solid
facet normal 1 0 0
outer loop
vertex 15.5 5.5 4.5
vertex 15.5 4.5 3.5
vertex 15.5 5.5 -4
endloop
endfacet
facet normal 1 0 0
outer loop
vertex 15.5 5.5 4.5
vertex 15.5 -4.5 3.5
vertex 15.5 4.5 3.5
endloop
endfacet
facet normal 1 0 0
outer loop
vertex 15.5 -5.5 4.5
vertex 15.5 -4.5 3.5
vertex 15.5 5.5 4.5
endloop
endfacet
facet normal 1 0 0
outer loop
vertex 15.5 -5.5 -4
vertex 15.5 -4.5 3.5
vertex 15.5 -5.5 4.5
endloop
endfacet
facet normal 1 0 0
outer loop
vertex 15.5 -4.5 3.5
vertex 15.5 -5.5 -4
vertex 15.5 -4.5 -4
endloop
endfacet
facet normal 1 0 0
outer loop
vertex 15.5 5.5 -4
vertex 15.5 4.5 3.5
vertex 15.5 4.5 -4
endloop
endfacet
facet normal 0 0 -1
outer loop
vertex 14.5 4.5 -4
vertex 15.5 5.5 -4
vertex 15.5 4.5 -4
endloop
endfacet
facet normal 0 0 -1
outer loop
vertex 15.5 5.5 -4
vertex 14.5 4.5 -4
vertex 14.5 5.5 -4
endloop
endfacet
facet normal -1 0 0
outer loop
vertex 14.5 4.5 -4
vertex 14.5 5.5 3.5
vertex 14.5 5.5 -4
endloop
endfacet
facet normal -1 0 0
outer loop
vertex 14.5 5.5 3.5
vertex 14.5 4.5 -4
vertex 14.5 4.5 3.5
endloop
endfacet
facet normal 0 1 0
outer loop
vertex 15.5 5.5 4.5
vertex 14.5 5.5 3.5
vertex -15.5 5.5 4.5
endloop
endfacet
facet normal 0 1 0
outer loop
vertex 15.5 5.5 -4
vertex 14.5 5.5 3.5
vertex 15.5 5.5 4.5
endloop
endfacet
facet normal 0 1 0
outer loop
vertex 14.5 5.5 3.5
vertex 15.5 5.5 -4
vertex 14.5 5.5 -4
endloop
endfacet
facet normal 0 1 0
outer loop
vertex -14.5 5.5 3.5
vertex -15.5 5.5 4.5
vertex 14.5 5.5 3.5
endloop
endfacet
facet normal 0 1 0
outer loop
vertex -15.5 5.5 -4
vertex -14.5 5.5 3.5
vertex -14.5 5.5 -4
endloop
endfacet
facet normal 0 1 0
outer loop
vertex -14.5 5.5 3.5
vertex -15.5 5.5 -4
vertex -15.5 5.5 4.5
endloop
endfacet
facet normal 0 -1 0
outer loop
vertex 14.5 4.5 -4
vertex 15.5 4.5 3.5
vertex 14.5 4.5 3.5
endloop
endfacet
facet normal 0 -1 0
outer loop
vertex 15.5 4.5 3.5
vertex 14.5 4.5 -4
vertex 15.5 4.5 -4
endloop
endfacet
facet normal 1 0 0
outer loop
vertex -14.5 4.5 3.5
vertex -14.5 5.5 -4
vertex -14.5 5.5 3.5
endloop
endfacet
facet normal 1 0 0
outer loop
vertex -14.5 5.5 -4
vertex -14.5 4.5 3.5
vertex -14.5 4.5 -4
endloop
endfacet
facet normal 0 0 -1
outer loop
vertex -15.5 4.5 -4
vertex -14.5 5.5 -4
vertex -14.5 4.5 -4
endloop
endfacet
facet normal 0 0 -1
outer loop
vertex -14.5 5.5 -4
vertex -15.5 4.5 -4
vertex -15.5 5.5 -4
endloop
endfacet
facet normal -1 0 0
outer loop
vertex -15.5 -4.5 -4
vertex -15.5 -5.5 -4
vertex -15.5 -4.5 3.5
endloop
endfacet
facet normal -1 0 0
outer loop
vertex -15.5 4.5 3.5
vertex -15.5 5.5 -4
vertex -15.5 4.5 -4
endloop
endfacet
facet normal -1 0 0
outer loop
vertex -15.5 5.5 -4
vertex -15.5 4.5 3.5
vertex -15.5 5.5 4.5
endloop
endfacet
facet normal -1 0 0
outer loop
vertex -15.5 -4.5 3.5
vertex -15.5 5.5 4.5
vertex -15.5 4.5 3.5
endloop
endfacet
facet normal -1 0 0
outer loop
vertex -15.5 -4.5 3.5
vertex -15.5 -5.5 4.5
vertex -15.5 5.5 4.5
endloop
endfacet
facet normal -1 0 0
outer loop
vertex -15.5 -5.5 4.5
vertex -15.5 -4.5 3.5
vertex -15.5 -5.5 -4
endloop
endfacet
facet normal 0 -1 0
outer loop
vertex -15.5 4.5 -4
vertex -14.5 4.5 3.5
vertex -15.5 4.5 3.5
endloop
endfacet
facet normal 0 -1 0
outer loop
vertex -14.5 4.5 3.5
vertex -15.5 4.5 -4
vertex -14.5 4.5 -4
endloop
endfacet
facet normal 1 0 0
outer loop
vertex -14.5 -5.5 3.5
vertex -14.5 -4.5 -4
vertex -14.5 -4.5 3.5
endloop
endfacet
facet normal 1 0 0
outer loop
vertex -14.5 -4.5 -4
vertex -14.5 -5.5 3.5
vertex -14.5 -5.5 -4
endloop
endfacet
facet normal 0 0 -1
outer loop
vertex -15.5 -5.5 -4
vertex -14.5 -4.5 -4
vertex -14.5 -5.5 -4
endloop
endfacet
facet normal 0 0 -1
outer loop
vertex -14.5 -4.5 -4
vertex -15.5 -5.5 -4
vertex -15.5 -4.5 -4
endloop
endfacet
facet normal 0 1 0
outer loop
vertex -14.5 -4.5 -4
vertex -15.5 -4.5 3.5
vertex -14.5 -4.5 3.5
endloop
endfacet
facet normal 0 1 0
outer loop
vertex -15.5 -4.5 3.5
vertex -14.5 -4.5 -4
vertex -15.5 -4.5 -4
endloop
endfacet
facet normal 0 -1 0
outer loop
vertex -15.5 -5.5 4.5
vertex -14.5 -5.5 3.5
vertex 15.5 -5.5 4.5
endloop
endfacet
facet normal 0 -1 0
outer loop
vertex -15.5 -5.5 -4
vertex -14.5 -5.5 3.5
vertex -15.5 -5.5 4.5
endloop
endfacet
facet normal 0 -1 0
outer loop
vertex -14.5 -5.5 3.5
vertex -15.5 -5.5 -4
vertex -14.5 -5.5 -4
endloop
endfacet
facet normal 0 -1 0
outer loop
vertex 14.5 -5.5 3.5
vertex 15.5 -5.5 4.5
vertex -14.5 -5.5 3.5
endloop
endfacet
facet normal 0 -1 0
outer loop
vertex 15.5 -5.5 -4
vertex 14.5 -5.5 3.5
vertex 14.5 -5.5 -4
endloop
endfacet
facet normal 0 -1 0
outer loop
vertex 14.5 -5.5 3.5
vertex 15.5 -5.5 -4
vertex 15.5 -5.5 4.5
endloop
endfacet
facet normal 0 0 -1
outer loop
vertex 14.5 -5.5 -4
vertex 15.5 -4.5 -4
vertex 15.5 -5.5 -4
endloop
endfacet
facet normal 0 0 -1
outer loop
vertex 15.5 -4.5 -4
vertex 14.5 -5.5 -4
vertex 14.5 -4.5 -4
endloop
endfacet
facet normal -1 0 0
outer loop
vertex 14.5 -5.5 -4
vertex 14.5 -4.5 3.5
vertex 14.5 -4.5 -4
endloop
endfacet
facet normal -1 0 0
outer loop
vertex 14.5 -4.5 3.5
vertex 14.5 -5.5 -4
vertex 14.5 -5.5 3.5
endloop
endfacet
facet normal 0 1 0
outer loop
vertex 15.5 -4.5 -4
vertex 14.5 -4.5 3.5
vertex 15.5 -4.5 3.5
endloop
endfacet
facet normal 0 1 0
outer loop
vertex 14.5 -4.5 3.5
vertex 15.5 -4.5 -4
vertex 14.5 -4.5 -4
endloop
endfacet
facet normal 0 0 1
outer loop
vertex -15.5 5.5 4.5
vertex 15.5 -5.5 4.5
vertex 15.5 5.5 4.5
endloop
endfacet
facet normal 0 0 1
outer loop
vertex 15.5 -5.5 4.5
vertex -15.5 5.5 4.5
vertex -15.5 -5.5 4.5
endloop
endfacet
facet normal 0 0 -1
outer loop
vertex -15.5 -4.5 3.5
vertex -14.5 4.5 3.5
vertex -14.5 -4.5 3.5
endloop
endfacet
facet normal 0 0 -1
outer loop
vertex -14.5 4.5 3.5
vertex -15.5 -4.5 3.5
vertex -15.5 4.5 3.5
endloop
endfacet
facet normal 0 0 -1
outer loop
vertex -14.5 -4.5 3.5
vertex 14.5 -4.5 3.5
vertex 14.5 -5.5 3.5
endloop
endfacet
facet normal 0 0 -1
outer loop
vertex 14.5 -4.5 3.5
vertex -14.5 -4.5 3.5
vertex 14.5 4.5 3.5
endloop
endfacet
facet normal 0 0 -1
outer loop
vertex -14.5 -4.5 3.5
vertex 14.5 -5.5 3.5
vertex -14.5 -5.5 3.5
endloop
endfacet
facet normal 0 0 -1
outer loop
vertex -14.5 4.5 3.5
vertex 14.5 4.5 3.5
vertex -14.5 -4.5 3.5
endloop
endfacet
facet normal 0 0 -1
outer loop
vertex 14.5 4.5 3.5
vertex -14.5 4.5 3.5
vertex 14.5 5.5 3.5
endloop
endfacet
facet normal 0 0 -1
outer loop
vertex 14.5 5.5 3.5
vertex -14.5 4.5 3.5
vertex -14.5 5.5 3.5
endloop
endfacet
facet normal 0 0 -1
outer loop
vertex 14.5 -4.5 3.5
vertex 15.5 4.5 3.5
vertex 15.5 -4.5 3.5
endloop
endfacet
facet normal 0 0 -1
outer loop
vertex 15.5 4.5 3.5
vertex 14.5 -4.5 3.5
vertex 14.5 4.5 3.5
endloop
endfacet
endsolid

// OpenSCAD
module Table_01(){

    Table_Leg = [1,1,8];

    Leg_Distance_x = 30;
    Leg_Distance_y = 10;

    color("#cdaa7d"){
    translate([Leg_Distance_x*0.5,Leg_Distance_y*0.5,0])
    cube([Table_Leg[0],Table_Leg[1],Table_Leg[2]],center=true);

    translate([-Leg_Distance_x*0.5,Leg_Distance_y*0.5,0])
    cube([Table_Leg[0],Table_Leg[1],Table_Leg[2]],center=true);

    translate([-Leg_Distance_x*0.5,-Leg_Distance_y*0.5,0])
    cube([Table_Leg[0],Table_Leg[1],Table_Leg[2]],center=true);

    translate([Leg_Distance_x*0.5,-Leg_Distance_y*0.5,0])
    cube([Table_Leg[0],Table_Leg[1],Table_Leg[2]],center=true);

    Table_Upper = [Leg_Distance_x+Table_Leg[0],Leg_Distance_y+Table_Leg[1],1];
    Table_Height = Table_Leg[2]*0.5;

    translate([0,0,Table_Height])
    cube([Table_Upper[0],Table_Upper[1],Table_Upper[2]],center=true);
    }

}

Table_01();

// Written by Nicolì Angelo (Gengio) 2024: 
// MIT License

//Permission is hereby granted, free of charge, to any person obtaining a copy of this software and associated documentation files (the "Software"), to deal in the Software without restriction, including without limitation the rights to use, copy, modify, merge, publish, distribute, sublicense, and/or sell copies of the Software, and to permit persons to whom the Software is furnished to do so, subject to the following conditions:

//The above copyright notice and this permission notice shall be included in all copies or substantial portions of the Software.

//THE SOFTWARE IS PROVIDED "AS IS", WITHOUT WARRANTY OF ANY KIND, EXPRESS OR IMPLIED, INCLUDING BUT NOT LIMITED TO THE WARRANTIES OF MERCHANTABILITY, FITNESS FOR A PARTICULAR PURPOSE AND NONINFRINGEMENT. IN NO EVENT SHALL THE AUTHORS OR COPYRIGHT HOLDERS BE LIABLE FOR ANY CLAIM, DAMAGES OR OTHER LIABILITY, WHETHER IN AN ACTION OF CONTRACT, TORT OR OTHERWISE, ARISING FROM, OUT OF OR IN CONNECTION WITH THE SOFTWARE OR THE USE OR OTHER DEALINGS IN THE SOFTWARE.
